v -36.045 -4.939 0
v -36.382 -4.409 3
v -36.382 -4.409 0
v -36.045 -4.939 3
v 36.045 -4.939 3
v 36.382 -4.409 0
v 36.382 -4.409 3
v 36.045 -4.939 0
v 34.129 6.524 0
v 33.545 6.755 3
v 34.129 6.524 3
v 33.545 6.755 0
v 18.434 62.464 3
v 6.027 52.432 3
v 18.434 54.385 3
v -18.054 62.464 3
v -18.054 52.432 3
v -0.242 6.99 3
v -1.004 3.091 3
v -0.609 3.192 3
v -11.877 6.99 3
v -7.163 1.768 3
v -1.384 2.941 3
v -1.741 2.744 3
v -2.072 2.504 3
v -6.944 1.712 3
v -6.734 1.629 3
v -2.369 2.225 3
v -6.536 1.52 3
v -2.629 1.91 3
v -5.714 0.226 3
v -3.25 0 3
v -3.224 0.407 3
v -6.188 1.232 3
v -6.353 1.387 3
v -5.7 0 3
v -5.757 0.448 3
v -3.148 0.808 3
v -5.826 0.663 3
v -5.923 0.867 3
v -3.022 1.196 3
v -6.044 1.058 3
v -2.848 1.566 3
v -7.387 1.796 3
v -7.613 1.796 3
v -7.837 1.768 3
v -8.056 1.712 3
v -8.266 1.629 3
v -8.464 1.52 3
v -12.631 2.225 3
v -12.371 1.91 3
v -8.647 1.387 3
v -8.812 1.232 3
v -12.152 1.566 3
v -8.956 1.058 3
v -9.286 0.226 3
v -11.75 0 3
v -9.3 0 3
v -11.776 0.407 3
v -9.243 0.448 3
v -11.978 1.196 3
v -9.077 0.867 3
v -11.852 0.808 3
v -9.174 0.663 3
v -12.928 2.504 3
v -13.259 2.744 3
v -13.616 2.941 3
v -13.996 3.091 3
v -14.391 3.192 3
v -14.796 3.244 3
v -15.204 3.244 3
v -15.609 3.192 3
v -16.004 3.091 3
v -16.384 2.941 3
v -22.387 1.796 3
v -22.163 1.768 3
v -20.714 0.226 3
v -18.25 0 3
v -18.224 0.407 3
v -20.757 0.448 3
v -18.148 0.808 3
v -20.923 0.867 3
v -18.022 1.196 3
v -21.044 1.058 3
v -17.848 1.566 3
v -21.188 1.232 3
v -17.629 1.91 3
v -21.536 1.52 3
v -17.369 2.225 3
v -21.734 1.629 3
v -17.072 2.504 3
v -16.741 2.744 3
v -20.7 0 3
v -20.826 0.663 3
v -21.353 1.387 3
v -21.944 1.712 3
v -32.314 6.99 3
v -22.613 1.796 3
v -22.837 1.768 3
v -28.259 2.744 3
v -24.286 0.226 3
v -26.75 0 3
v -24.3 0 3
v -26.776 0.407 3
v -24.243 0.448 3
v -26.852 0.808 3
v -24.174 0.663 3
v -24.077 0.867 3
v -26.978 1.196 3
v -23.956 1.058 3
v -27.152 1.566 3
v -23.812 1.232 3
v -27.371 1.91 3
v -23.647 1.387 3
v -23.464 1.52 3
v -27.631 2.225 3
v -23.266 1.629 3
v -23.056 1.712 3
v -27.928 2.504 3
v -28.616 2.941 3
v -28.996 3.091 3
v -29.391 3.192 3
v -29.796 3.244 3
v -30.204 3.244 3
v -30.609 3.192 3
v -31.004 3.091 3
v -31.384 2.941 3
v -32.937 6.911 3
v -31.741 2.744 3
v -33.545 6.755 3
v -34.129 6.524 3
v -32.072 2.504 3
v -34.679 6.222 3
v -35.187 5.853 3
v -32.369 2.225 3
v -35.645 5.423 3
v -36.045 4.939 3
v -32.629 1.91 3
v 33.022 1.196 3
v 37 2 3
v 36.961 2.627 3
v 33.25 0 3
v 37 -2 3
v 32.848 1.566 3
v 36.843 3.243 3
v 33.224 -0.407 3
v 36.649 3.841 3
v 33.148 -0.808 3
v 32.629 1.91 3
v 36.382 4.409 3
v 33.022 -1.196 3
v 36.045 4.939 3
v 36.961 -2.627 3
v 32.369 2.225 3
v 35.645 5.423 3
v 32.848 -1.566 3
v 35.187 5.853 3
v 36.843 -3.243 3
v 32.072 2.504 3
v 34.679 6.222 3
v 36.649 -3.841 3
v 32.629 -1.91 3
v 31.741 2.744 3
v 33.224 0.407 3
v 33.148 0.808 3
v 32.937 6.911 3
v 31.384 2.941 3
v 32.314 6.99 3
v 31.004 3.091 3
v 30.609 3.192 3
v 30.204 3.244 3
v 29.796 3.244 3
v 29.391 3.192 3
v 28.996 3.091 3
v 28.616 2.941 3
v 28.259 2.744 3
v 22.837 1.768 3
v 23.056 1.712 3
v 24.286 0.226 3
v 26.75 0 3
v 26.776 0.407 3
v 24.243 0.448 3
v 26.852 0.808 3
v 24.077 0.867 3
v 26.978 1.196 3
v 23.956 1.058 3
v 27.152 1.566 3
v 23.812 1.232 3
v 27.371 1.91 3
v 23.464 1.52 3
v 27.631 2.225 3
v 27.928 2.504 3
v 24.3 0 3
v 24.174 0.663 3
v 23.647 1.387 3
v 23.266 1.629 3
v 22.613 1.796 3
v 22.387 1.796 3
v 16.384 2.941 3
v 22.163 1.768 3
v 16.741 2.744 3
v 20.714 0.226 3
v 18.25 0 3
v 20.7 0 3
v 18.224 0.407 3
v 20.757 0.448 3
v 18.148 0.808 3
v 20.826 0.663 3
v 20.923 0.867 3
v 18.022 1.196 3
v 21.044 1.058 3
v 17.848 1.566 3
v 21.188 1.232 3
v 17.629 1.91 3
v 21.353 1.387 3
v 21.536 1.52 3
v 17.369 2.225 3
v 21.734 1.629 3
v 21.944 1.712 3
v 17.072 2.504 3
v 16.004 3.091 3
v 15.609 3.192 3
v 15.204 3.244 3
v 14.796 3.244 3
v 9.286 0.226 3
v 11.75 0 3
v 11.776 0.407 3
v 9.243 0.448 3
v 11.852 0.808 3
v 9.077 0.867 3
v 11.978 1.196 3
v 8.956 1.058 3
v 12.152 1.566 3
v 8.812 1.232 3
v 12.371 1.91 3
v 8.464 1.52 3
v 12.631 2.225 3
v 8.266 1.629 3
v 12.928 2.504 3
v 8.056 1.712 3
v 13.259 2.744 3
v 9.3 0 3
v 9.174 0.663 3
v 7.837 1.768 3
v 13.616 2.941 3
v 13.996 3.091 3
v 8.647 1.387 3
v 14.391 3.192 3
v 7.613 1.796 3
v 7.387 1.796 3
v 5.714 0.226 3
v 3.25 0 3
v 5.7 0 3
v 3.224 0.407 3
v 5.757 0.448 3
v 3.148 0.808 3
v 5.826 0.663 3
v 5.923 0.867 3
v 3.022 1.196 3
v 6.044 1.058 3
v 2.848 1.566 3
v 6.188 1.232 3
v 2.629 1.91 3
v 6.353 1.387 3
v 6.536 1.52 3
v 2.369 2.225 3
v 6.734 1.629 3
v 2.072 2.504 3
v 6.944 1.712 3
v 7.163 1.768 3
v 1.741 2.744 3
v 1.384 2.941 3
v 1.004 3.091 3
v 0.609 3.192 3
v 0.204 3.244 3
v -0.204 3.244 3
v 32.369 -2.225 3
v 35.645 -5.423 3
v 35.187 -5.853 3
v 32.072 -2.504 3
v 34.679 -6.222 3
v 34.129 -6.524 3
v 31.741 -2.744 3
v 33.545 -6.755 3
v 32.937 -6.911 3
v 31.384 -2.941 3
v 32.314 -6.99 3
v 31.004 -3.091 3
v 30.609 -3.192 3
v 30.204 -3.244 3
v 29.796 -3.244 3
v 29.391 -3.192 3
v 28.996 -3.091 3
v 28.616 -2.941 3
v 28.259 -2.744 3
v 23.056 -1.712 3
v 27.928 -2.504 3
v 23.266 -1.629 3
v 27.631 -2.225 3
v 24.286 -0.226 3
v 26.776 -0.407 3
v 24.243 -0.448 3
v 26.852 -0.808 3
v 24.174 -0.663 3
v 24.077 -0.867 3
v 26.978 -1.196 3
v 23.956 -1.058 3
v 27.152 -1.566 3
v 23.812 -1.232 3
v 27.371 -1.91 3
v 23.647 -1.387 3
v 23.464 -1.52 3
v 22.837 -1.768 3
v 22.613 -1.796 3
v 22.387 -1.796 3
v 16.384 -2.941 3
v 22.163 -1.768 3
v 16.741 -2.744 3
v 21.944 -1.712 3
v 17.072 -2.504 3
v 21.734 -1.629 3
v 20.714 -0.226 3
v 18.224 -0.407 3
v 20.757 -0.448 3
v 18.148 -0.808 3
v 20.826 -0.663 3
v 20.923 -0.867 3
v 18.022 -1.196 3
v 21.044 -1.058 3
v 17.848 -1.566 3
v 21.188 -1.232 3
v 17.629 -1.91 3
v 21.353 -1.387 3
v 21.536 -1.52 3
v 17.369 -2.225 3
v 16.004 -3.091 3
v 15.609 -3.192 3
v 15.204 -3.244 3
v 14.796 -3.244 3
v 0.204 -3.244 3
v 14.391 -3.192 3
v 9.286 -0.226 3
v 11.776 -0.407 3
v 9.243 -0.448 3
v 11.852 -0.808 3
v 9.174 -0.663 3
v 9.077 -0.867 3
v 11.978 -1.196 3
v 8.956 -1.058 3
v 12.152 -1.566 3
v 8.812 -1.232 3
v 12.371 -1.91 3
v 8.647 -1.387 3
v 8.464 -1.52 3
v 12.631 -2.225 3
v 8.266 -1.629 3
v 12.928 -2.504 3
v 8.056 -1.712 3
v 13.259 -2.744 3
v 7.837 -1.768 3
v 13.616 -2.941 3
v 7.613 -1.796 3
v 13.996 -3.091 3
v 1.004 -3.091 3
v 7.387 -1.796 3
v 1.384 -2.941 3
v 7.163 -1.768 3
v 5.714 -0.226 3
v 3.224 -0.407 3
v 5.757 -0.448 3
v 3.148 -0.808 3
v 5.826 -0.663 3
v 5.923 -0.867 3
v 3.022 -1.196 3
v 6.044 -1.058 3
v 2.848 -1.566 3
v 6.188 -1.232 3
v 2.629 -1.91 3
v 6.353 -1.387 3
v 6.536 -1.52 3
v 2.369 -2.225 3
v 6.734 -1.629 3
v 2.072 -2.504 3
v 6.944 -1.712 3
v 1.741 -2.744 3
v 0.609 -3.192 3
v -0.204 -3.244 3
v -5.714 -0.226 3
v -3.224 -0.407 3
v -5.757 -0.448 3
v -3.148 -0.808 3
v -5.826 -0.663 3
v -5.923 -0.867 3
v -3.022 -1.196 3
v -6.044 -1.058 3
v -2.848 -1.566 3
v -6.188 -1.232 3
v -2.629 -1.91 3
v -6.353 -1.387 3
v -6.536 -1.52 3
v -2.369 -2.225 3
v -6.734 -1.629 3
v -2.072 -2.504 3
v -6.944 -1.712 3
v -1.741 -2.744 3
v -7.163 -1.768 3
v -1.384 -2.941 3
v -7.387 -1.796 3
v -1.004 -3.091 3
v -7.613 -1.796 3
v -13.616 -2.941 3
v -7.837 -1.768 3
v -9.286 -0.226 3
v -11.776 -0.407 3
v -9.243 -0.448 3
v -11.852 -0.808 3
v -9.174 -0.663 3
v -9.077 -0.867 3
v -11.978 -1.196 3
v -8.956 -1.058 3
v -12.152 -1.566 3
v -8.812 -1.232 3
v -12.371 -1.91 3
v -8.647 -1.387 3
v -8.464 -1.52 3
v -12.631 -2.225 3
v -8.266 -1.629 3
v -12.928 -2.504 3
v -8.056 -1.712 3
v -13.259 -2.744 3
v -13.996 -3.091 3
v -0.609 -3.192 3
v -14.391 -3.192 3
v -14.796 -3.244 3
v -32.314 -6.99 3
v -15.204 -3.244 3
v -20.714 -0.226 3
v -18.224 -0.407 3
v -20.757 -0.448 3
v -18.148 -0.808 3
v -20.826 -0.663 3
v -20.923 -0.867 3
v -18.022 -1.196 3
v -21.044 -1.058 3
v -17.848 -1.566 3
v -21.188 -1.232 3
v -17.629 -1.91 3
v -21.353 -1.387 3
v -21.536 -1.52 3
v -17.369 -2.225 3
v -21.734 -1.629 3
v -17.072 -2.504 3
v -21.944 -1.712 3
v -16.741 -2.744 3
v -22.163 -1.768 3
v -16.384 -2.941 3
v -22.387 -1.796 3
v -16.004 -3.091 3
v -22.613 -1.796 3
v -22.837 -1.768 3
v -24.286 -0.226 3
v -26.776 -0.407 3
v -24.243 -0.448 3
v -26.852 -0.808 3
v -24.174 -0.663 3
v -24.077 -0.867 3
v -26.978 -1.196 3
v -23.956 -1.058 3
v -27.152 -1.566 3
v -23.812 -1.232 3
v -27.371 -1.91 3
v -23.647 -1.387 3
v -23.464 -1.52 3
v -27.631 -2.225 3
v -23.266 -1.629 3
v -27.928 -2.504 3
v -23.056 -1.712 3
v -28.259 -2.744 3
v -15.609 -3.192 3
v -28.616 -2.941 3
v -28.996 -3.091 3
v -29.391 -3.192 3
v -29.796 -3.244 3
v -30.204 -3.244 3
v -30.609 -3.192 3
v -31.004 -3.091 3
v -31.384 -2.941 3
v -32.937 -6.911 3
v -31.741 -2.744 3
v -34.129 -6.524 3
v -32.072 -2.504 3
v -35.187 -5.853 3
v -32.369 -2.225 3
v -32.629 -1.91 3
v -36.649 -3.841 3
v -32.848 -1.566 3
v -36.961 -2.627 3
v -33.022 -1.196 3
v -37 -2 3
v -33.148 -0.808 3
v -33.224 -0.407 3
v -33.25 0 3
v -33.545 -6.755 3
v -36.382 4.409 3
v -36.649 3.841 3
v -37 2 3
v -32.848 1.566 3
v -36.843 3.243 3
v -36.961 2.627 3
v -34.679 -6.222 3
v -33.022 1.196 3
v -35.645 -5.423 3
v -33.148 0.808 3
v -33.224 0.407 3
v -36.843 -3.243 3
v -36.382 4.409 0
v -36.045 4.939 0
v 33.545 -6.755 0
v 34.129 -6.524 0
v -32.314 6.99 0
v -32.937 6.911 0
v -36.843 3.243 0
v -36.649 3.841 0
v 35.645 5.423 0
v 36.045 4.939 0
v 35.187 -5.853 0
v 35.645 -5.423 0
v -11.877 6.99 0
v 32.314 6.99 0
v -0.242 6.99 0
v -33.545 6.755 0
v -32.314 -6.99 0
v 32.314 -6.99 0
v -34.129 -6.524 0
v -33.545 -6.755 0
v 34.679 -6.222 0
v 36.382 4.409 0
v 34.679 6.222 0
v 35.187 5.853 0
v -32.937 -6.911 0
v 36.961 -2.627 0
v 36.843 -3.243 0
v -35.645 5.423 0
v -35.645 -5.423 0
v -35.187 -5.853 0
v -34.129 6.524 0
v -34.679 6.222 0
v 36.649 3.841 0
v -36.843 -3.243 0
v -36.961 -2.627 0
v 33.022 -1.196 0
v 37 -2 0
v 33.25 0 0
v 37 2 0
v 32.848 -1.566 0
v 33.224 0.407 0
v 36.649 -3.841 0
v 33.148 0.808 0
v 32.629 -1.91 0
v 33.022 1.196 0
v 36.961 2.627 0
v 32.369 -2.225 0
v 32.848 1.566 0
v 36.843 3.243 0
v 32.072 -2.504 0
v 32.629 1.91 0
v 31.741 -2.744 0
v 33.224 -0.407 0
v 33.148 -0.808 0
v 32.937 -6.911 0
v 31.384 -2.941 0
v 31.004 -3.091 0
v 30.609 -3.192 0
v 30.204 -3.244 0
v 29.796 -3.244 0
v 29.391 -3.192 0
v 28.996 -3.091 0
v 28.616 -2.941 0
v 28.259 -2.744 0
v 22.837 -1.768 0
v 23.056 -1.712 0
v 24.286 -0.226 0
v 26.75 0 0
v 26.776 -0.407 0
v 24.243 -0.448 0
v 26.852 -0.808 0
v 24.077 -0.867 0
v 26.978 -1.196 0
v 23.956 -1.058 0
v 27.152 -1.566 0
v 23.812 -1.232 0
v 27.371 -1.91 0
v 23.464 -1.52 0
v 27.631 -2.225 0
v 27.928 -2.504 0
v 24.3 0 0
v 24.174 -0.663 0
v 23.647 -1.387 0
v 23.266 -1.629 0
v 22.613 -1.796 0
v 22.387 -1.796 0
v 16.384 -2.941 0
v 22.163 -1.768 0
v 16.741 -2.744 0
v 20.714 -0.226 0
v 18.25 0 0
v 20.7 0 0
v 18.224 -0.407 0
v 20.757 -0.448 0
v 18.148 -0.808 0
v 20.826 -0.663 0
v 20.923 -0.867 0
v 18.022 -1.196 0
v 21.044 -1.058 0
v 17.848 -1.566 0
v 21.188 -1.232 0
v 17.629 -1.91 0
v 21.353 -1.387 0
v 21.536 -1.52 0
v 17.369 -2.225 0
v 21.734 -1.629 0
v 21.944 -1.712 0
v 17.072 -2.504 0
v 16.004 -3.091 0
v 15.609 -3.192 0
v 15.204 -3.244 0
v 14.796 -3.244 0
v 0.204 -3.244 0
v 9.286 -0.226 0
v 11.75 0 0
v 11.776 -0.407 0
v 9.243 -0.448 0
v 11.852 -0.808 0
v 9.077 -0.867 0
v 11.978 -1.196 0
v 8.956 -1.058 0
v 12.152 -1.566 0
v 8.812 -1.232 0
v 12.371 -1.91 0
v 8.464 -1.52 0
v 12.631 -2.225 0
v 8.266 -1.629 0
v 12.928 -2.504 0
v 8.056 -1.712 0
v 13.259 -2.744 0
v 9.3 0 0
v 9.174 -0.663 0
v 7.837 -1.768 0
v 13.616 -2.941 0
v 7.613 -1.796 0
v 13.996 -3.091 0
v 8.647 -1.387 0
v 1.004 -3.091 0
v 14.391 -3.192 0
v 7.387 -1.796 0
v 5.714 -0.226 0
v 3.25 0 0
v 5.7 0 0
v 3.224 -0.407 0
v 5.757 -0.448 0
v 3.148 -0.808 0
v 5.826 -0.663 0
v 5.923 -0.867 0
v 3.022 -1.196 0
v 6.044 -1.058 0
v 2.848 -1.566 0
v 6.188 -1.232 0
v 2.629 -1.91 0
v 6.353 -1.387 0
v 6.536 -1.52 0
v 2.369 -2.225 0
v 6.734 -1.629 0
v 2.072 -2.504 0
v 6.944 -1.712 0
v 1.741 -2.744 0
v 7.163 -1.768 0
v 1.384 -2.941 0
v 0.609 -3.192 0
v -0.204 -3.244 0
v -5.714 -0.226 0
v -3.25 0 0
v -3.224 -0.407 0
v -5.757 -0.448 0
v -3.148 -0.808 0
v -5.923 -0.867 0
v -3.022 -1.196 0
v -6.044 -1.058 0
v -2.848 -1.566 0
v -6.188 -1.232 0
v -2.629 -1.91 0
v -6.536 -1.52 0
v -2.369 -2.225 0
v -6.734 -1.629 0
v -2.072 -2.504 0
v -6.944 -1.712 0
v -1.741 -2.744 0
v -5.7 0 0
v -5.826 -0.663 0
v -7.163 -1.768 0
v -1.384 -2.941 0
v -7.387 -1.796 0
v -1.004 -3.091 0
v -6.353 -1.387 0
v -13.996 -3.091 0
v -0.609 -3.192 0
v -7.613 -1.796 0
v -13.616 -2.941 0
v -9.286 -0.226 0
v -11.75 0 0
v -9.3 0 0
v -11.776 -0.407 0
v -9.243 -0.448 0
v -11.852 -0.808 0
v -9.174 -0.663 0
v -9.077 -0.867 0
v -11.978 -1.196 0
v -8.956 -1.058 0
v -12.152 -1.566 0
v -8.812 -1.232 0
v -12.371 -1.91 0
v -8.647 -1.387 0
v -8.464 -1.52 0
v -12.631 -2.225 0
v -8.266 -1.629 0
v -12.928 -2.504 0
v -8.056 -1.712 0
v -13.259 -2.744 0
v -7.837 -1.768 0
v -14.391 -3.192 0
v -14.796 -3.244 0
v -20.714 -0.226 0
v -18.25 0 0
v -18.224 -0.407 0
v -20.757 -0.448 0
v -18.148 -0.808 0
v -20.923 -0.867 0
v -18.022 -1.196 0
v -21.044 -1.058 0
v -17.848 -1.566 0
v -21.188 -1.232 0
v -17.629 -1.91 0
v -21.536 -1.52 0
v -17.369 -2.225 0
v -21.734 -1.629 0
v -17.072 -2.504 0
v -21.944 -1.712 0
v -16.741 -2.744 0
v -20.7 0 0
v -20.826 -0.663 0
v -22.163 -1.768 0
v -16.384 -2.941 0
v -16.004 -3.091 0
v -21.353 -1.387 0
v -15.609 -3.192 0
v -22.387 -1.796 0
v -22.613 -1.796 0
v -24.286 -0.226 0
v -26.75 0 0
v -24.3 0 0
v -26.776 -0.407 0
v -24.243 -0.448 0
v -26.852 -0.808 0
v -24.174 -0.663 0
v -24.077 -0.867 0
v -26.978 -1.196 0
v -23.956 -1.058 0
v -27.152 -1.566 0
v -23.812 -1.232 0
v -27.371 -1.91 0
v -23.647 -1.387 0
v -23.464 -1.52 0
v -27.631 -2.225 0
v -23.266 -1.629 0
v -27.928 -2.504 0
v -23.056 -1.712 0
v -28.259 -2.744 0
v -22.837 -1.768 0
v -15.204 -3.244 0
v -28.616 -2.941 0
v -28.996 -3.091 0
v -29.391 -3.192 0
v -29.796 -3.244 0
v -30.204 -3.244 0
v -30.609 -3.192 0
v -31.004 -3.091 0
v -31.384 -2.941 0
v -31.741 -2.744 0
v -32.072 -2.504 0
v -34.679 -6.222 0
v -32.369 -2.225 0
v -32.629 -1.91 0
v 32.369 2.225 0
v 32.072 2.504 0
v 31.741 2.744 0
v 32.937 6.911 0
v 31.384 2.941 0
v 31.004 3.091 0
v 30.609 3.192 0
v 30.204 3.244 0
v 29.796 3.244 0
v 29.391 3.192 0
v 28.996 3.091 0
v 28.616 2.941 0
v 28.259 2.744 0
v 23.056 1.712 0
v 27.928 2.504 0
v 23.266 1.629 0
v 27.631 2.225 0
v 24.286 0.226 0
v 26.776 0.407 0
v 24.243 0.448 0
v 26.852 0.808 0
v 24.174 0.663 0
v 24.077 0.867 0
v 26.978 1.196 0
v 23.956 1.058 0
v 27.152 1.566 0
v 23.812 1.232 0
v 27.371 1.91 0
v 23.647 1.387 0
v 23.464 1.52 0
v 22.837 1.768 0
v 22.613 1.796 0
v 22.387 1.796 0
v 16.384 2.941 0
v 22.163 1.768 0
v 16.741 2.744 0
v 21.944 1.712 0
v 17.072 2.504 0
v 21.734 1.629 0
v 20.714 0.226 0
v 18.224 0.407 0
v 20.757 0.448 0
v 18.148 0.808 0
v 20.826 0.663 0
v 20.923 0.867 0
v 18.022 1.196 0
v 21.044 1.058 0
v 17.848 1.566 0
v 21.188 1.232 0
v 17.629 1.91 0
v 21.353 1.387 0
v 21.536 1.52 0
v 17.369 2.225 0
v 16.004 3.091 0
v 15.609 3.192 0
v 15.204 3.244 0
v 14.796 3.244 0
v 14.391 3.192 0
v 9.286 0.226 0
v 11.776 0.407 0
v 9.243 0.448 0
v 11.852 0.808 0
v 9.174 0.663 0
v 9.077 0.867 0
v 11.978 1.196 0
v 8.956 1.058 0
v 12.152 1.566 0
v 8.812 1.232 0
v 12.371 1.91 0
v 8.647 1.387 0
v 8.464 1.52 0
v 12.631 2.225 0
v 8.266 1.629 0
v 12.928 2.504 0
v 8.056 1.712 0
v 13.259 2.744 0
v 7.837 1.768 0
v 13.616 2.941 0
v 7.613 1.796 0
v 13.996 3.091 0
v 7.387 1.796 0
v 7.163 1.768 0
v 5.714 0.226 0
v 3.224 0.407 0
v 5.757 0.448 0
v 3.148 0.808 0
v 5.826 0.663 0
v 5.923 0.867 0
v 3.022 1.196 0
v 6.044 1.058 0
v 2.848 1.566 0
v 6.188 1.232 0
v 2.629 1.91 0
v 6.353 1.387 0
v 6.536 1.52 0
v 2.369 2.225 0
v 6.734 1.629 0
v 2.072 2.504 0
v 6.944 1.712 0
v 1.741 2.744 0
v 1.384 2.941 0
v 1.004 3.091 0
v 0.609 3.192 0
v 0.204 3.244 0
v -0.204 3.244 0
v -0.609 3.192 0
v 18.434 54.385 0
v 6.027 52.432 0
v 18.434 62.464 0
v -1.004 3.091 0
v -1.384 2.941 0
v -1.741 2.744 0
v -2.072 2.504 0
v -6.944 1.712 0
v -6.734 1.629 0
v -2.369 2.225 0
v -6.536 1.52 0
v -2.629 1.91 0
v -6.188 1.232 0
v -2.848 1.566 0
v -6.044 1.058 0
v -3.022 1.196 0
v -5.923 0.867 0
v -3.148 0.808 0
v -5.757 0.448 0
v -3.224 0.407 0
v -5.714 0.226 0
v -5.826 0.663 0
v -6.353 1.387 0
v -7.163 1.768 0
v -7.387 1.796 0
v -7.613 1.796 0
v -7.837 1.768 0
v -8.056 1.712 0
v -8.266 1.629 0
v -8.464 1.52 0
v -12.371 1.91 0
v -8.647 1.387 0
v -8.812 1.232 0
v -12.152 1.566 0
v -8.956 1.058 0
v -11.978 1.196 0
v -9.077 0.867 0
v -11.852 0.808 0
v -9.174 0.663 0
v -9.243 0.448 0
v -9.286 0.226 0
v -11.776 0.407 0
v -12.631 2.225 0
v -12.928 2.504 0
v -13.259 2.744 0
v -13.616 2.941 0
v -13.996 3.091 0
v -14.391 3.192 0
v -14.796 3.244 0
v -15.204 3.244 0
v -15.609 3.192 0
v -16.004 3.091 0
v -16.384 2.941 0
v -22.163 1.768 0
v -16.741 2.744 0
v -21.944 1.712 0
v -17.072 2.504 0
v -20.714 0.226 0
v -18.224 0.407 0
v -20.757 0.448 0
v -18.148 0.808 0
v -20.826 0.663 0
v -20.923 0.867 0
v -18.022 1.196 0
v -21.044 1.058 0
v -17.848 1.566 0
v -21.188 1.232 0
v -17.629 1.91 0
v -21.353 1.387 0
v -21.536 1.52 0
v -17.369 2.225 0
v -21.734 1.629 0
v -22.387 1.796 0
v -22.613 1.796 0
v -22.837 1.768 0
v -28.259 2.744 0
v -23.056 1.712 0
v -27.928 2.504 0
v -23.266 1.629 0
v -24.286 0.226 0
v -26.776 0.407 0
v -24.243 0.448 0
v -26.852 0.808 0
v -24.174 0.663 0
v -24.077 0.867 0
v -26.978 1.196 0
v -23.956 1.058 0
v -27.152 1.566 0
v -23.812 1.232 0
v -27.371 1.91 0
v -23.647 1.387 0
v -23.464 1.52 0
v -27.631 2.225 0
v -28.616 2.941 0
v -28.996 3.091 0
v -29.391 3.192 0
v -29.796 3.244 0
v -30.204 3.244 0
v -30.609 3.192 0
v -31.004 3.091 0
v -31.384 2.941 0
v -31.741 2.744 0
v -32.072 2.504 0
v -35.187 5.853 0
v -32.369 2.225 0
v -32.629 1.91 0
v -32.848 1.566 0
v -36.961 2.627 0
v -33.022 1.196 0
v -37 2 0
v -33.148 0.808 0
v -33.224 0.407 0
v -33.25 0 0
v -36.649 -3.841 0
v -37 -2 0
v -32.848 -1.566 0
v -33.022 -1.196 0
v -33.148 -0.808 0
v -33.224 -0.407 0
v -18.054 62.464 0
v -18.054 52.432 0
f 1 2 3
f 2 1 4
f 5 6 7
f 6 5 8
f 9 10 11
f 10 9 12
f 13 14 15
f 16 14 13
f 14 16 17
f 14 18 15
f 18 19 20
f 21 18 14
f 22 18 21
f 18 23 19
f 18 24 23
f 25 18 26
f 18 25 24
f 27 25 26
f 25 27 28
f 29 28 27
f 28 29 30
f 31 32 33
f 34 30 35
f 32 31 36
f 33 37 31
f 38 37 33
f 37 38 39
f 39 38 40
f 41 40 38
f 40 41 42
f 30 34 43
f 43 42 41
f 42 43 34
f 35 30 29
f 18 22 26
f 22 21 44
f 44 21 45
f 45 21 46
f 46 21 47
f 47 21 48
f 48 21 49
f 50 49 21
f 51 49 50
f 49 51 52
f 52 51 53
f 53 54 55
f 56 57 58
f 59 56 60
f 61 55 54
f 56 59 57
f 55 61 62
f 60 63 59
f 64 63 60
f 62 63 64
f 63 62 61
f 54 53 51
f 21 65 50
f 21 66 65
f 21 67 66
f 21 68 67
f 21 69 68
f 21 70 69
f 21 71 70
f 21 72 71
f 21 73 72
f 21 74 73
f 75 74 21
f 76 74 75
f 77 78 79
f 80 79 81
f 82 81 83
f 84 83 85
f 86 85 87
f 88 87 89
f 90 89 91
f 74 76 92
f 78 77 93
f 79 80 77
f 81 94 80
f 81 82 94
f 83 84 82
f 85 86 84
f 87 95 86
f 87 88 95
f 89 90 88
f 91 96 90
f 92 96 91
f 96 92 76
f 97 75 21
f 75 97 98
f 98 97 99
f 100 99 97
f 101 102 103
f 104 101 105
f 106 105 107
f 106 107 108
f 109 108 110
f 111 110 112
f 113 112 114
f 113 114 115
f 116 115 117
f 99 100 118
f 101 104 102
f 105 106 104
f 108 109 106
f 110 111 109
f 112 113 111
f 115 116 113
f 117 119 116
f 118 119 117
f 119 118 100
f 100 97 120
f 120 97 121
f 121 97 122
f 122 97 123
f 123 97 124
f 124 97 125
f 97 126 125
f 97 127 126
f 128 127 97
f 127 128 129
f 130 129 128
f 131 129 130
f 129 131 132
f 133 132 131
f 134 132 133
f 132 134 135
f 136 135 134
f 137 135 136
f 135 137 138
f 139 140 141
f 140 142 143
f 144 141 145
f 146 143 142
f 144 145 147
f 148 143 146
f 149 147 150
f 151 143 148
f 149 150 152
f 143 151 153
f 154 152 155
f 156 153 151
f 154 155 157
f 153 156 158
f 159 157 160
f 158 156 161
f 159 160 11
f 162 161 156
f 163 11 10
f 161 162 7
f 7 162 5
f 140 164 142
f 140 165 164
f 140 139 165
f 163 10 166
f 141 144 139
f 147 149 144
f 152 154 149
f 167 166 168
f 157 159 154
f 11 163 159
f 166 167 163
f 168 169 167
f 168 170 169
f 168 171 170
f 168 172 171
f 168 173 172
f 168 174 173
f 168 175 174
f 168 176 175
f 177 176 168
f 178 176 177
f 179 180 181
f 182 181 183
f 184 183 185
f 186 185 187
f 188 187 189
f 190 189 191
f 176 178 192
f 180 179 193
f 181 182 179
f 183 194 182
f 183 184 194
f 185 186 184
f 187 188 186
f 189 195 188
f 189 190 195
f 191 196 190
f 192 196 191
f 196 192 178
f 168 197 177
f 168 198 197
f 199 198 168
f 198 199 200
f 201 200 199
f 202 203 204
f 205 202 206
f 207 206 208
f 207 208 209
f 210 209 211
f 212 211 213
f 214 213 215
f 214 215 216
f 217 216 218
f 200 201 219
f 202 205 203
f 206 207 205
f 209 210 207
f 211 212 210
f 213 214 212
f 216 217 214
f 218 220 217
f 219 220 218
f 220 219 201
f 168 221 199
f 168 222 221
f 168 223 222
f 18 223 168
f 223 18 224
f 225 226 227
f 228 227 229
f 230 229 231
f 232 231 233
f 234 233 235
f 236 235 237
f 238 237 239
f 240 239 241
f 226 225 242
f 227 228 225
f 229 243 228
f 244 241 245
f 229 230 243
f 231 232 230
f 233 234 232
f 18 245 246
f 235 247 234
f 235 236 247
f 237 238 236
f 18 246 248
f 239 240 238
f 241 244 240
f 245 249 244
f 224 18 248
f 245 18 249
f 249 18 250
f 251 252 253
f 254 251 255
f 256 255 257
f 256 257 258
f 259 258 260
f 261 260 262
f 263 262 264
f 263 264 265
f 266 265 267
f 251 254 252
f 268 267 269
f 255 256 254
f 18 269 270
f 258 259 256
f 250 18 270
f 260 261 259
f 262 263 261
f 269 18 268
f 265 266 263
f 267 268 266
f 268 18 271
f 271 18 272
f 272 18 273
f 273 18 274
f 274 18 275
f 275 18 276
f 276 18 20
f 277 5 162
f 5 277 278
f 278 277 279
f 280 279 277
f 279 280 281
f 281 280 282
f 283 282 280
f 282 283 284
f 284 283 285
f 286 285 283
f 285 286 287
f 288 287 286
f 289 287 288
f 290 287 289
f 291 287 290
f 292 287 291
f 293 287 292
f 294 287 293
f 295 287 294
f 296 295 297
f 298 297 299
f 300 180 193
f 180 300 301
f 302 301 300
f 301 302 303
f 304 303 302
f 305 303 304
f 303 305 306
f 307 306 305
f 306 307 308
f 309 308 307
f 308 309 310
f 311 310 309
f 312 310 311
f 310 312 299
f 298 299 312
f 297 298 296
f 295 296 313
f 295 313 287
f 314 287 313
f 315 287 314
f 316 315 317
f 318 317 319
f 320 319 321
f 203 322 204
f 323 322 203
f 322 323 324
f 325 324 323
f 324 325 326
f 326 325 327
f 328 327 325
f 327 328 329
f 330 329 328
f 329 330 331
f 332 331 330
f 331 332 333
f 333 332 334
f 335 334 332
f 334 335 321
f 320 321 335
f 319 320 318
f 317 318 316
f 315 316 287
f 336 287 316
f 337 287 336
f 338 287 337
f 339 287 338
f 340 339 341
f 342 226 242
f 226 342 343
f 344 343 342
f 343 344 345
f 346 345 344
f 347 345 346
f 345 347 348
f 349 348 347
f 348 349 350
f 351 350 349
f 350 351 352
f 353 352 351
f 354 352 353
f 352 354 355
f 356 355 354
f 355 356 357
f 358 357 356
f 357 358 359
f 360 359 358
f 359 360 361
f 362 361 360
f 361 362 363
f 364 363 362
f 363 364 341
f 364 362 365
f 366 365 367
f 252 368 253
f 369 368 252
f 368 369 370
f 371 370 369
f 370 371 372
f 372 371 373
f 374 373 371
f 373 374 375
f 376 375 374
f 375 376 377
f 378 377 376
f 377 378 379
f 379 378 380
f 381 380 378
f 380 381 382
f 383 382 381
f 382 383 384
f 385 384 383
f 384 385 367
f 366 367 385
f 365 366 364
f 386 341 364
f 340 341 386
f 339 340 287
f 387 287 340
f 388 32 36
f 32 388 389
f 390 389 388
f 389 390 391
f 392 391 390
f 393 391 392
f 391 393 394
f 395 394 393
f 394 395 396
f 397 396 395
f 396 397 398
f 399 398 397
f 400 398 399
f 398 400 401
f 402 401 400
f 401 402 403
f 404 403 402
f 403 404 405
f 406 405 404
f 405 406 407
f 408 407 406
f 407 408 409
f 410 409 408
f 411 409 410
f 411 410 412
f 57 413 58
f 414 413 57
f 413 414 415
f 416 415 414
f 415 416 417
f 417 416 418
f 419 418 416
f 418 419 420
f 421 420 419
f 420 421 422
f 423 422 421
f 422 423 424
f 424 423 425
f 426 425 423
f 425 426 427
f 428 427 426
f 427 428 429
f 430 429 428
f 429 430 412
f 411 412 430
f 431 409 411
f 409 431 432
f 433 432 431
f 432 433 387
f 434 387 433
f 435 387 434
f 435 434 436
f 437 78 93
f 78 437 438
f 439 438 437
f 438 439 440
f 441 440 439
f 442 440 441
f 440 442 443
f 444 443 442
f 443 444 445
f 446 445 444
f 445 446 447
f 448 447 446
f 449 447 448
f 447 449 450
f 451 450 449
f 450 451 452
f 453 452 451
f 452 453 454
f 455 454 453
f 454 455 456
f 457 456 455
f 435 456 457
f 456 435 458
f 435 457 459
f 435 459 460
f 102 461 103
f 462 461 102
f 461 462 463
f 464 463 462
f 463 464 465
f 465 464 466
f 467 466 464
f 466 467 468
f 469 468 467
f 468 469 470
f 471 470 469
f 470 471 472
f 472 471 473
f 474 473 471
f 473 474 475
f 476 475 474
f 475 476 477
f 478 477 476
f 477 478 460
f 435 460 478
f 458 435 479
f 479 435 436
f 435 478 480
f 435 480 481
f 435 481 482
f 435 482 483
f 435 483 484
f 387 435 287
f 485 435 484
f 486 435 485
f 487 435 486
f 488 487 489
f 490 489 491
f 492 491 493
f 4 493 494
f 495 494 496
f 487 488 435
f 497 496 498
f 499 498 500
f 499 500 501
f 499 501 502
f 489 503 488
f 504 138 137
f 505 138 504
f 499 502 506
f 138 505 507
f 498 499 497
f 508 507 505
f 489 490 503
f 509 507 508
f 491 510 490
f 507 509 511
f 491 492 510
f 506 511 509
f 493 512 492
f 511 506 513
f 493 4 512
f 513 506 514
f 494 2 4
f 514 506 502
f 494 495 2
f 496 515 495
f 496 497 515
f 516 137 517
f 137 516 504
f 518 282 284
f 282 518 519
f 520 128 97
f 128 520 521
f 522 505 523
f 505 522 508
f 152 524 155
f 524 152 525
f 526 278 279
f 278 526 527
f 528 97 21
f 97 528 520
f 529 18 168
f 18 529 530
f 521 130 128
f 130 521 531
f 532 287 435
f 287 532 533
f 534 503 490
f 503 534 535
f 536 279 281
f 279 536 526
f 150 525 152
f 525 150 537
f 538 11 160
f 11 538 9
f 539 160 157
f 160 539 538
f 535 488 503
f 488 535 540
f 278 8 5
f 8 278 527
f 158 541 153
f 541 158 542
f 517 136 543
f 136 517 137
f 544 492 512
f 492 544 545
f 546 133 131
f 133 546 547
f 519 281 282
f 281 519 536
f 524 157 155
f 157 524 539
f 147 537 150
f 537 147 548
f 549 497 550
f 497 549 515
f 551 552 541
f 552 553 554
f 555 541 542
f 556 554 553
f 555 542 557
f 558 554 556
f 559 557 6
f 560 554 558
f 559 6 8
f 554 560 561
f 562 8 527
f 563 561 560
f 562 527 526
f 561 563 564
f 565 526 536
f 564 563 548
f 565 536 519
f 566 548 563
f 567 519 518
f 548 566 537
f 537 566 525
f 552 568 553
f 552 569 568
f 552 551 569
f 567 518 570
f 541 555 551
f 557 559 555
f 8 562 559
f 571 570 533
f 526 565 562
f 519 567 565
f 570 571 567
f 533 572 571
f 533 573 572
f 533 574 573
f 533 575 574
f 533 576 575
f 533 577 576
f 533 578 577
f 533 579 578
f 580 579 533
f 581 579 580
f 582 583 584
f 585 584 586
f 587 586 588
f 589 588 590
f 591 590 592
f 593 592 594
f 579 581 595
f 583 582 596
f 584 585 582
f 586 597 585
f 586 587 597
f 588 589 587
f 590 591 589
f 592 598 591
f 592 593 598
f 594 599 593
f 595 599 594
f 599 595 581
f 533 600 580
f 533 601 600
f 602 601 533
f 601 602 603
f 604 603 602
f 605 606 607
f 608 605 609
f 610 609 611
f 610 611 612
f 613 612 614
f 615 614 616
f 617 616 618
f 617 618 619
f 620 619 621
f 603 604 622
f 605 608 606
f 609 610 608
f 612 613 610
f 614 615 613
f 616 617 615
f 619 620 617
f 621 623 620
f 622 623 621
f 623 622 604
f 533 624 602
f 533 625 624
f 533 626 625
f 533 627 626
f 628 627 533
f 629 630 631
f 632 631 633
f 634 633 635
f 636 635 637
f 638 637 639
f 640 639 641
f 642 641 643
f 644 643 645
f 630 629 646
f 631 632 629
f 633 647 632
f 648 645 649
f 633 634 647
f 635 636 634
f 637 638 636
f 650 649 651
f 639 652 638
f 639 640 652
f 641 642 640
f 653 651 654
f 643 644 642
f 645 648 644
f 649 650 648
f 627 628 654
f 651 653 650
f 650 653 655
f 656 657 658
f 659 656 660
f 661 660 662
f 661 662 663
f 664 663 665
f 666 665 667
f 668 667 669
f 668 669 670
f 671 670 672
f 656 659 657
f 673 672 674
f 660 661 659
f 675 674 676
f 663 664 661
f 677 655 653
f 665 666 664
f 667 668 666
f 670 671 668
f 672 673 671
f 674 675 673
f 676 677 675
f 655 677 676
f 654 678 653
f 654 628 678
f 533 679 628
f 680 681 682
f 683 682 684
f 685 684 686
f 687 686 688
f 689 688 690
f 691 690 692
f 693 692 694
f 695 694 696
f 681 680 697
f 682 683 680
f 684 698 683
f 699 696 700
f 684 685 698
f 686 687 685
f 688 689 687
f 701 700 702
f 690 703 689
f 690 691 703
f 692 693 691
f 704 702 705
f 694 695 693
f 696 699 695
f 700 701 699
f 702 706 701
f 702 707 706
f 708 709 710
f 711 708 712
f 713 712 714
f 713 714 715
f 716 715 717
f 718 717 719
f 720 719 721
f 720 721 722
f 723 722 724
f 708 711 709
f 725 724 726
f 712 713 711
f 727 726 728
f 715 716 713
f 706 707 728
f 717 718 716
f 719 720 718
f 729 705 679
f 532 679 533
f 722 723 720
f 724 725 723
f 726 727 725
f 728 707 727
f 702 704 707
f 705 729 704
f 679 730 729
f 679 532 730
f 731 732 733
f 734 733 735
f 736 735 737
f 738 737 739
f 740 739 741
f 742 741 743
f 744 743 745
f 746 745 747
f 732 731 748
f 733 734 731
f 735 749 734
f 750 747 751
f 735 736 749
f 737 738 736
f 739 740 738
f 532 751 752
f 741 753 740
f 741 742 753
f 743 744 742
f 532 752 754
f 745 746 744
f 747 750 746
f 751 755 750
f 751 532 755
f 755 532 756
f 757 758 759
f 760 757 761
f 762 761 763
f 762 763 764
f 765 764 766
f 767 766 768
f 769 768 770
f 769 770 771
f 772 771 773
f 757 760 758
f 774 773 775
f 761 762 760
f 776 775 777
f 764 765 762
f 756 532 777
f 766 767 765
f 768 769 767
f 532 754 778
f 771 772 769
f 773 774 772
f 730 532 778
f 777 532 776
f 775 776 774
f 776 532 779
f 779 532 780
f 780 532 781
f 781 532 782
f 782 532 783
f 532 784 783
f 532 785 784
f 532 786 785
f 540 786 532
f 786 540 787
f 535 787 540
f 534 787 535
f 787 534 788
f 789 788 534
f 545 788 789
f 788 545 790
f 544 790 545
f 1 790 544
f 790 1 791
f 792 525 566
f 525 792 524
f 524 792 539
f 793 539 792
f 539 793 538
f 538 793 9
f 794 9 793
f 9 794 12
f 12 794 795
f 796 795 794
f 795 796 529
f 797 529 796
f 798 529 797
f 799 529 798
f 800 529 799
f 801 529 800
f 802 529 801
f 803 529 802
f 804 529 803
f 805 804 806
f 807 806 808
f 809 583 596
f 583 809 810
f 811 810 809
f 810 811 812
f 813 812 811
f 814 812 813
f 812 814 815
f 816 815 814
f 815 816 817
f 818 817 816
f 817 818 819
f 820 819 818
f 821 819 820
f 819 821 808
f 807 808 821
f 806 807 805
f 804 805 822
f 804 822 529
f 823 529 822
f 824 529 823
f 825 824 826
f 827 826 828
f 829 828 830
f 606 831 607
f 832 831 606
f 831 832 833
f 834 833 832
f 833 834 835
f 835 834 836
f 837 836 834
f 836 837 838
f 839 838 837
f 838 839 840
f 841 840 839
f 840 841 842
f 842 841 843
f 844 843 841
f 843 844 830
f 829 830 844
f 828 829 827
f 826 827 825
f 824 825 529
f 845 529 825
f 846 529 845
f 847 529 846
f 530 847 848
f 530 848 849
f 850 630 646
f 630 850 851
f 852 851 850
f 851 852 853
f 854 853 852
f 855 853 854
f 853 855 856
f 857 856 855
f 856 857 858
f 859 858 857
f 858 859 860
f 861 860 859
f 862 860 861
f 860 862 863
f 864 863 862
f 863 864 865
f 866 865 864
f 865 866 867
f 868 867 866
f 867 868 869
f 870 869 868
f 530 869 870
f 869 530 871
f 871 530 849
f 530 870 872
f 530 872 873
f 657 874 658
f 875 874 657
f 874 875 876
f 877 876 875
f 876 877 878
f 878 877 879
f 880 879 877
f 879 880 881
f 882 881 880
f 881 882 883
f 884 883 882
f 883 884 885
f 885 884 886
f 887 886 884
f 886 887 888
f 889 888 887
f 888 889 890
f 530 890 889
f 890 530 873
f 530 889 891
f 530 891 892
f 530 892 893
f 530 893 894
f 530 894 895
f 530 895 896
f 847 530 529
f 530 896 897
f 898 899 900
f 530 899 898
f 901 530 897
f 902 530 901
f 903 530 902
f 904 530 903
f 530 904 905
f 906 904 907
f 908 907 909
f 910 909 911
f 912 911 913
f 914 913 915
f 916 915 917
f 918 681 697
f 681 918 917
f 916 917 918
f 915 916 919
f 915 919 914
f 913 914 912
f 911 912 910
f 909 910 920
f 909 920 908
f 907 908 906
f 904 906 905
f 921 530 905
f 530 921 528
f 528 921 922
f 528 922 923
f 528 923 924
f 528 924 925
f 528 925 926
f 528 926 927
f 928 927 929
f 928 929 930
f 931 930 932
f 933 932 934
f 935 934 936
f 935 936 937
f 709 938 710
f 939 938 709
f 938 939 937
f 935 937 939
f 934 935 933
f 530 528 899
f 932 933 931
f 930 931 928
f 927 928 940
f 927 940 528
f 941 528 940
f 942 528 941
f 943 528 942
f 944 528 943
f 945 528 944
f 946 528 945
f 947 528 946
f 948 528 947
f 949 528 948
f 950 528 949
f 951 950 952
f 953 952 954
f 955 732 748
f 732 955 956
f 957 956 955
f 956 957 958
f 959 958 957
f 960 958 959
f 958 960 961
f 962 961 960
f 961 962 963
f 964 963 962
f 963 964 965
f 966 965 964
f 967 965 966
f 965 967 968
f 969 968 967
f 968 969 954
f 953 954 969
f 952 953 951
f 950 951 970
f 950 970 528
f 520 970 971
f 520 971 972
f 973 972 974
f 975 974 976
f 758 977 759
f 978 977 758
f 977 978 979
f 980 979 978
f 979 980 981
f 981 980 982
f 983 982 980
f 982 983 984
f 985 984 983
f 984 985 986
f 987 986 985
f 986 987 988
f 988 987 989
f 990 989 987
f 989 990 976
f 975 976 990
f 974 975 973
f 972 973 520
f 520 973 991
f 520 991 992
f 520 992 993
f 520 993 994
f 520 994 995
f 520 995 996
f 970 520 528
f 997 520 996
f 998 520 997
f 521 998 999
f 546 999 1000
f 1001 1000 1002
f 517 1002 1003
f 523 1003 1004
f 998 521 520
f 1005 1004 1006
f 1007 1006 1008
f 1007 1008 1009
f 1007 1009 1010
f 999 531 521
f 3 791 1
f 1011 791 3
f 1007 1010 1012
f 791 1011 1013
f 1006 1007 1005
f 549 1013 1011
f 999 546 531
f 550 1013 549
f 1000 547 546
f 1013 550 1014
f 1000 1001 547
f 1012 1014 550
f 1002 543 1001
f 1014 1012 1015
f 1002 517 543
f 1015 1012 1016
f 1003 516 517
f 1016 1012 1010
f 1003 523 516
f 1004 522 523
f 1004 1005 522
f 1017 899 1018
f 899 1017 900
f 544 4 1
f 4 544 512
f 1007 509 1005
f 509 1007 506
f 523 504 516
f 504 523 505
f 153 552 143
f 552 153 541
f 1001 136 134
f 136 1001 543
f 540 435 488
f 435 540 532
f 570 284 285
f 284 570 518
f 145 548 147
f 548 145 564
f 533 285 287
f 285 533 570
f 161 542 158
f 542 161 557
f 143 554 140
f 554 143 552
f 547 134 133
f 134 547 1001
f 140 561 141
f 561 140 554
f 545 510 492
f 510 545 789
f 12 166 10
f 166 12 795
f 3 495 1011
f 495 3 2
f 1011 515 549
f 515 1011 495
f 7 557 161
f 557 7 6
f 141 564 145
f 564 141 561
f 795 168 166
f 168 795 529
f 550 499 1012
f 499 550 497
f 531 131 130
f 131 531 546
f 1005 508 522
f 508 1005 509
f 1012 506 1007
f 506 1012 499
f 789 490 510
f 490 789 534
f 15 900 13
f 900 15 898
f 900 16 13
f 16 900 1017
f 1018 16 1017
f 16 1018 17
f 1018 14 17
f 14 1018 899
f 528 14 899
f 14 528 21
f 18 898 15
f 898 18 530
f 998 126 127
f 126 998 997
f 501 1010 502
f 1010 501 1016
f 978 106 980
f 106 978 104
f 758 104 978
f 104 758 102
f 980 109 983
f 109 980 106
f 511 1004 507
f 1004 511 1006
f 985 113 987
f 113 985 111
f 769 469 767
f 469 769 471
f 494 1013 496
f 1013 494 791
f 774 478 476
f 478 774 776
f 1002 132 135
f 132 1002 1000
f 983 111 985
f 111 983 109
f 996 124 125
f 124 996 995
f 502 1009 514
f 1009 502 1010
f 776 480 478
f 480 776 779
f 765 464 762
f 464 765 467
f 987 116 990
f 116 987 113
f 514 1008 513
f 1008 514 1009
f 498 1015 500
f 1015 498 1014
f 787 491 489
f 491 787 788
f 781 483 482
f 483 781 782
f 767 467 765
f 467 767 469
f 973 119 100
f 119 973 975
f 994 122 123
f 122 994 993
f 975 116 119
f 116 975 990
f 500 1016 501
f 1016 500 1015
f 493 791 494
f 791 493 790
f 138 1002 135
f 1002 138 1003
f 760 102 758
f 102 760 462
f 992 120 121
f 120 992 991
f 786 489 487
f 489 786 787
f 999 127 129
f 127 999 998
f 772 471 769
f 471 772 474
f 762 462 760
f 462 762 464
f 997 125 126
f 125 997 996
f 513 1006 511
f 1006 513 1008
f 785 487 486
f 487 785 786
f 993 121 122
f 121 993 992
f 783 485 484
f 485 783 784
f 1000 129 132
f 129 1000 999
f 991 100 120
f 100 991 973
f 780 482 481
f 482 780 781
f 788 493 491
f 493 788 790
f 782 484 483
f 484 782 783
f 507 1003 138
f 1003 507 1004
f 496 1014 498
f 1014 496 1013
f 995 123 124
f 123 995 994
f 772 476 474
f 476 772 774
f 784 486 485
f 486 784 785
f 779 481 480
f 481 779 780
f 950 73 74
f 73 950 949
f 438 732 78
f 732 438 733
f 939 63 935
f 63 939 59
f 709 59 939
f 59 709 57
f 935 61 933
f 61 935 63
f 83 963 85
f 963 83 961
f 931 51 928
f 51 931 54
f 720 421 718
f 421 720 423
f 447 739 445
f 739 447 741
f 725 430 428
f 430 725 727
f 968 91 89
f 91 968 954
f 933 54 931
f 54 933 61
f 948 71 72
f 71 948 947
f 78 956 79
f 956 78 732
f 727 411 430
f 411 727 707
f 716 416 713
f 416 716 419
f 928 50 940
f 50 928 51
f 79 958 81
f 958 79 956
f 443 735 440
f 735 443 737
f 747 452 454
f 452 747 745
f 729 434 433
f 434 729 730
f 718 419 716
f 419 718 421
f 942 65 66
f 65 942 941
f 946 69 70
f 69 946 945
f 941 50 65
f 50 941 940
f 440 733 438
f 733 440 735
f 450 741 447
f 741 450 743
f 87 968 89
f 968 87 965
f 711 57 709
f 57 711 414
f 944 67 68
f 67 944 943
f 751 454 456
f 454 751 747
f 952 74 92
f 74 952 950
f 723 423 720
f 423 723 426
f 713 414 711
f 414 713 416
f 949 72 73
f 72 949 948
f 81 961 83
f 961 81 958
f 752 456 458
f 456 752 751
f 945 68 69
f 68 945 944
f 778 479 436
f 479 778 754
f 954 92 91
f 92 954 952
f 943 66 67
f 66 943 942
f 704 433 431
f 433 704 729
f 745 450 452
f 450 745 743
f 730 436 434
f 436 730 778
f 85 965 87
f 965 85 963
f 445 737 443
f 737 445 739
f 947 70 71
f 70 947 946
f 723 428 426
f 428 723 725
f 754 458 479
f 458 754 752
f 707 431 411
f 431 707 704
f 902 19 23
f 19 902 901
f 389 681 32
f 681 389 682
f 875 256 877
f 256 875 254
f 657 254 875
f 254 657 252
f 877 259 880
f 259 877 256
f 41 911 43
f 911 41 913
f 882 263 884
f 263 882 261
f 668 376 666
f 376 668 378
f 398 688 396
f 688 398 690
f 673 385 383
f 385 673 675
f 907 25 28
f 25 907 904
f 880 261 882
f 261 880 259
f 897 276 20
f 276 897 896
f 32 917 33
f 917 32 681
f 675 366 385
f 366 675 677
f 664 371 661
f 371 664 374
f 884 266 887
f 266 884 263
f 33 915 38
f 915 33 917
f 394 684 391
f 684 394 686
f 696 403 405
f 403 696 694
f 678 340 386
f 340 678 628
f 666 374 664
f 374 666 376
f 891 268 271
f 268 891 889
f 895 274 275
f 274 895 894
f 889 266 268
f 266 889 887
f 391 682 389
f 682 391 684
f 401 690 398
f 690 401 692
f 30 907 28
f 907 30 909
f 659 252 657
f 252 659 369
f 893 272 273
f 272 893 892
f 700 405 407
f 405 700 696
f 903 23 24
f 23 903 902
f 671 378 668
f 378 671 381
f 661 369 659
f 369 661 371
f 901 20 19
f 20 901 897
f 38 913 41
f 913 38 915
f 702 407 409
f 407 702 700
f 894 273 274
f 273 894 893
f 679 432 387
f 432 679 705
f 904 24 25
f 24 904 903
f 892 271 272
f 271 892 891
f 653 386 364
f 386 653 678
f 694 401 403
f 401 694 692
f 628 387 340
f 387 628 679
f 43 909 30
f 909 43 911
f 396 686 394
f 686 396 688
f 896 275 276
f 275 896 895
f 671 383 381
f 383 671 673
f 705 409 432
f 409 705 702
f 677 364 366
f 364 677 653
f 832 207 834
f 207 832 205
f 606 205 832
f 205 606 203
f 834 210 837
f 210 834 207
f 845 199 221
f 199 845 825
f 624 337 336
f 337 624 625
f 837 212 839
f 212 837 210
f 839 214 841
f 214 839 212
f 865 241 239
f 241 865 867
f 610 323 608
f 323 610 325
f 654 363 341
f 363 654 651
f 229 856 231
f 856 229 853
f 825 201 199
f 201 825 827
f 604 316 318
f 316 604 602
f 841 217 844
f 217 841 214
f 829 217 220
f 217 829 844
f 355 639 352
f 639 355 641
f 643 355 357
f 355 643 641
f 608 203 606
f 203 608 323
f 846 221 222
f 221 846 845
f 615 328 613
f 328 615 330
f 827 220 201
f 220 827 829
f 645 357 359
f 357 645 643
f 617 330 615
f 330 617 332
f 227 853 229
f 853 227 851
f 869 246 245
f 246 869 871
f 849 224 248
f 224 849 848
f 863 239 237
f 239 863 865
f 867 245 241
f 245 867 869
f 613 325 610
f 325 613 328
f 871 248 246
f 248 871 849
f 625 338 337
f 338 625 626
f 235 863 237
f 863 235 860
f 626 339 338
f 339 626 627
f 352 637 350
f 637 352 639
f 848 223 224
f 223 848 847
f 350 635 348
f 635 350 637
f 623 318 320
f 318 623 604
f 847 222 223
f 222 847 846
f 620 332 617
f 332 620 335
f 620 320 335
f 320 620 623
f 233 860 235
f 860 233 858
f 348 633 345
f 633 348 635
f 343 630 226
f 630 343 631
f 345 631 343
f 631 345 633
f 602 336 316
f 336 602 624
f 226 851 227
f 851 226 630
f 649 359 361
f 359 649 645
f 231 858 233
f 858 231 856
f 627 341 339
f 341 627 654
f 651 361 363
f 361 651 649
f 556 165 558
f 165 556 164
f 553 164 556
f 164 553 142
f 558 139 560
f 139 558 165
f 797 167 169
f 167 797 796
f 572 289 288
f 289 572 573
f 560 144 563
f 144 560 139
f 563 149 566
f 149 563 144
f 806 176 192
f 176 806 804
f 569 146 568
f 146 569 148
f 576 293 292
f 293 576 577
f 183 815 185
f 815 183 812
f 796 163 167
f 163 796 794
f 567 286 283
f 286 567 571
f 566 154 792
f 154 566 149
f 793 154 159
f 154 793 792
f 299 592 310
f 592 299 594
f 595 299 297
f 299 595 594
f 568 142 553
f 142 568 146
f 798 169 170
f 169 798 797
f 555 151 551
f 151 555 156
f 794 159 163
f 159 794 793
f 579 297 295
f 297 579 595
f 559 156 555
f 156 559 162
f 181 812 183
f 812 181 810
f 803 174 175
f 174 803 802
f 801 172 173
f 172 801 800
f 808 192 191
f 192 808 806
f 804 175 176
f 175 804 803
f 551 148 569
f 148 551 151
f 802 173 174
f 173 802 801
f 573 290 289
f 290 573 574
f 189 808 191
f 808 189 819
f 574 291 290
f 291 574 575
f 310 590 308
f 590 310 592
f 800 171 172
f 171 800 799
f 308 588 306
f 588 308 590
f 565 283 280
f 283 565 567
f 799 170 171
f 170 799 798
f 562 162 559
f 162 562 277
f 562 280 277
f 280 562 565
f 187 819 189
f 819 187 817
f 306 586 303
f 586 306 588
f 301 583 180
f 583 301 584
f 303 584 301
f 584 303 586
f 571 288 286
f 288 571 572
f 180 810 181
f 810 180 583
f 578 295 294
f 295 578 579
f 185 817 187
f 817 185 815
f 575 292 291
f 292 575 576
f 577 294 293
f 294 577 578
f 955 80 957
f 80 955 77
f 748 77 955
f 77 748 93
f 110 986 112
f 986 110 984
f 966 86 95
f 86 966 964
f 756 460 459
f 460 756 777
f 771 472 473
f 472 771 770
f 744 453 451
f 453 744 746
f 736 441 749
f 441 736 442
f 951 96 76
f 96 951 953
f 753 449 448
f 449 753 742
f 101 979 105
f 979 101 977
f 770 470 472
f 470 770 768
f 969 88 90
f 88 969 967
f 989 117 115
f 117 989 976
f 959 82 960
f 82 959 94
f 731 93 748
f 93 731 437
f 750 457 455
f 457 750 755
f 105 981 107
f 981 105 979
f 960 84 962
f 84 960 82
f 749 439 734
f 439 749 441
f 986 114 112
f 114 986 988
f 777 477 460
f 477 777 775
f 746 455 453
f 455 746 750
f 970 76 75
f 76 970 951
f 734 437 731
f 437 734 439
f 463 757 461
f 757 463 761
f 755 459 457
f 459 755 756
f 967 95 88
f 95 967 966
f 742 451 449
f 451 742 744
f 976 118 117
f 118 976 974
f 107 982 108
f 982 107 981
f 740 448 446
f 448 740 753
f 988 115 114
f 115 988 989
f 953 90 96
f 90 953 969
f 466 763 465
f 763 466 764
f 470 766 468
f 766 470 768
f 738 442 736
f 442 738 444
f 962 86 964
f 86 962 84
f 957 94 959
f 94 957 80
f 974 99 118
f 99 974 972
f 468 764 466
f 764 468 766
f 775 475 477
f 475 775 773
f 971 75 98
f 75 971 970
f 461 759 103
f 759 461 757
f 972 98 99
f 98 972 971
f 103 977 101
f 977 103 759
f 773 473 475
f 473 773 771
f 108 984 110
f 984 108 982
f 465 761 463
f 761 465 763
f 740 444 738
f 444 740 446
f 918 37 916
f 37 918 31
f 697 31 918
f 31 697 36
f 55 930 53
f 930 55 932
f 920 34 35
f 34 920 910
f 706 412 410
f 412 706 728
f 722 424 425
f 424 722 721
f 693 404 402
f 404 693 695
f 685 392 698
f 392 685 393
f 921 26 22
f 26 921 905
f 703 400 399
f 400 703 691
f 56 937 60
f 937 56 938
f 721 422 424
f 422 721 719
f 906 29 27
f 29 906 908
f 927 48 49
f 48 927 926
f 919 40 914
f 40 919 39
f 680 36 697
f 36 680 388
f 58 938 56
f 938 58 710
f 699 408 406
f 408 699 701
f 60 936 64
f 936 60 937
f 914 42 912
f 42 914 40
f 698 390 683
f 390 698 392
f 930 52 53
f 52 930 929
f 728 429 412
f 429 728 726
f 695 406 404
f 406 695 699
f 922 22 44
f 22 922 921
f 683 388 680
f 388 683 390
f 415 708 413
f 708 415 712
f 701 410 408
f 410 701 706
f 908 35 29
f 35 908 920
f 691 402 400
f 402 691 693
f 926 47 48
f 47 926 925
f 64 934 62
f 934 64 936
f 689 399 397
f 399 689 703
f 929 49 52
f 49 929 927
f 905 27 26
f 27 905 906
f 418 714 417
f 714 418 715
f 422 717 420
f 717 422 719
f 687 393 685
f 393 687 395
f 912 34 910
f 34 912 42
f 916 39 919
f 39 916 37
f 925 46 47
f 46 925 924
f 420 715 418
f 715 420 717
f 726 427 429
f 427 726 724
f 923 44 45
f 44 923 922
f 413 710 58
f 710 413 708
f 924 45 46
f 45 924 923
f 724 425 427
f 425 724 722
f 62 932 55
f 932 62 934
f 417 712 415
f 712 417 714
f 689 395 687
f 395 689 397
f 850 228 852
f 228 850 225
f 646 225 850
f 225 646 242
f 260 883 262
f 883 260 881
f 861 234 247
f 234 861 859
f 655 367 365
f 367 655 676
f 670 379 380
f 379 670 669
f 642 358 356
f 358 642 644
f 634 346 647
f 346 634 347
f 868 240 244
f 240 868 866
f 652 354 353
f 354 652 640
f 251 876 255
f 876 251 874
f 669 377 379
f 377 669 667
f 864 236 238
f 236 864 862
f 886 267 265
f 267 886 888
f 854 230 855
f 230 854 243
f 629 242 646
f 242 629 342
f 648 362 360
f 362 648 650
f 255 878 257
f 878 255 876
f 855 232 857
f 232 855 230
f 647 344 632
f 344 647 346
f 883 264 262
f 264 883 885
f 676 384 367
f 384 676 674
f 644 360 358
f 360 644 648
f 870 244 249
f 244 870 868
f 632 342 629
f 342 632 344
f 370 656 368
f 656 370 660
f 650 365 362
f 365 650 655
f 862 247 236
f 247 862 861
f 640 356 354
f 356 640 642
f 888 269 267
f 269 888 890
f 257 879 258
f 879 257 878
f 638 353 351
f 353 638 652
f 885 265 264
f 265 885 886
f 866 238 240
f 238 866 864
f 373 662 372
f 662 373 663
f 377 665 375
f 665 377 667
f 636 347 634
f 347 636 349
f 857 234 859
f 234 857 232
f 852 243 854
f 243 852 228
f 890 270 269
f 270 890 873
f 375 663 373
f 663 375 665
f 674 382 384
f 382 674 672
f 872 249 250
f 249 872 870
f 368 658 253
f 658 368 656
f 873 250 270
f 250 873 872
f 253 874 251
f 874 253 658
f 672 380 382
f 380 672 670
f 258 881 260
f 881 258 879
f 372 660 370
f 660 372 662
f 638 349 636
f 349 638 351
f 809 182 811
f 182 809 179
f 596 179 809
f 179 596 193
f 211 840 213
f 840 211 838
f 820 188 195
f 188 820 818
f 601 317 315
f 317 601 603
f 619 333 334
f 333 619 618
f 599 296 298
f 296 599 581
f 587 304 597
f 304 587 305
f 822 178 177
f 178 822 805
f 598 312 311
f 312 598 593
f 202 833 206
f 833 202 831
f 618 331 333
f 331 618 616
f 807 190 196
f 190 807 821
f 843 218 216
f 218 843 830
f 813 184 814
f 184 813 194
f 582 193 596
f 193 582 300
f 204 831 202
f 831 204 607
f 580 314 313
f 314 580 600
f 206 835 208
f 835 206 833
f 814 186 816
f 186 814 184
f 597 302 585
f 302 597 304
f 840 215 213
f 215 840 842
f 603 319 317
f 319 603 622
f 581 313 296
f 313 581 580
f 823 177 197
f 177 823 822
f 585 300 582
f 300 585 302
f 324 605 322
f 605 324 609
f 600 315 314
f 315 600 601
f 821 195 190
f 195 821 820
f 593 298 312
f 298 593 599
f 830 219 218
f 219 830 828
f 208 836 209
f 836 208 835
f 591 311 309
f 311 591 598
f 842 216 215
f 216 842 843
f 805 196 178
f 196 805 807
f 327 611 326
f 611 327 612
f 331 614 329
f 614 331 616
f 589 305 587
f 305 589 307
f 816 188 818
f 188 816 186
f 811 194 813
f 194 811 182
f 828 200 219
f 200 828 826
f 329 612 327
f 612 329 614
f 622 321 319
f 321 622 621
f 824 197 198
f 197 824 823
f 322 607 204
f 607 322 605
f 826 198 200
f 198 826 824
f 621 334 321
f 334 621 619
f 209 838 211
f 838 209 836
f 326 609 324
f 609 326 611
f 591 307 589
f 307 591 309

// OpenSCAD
$fn = 50;


difference() {
	union() {
		hull() {
			translate(v = [-32.0000000000, 2.0000000000, 0]) {
				cylinder(h = 3, r = 5);
			}
			translate(v = [32.0000000000, 2.0000000000, 0]) {
				cylinder(h = 3, r = 5);
			}
			translate(v = [-32.0000000000, -2.0000000000, 0]) {
				cylinder(h = 3, r = 5);
			}
			translate(v = [32.0000000000, -2.0000000000, 0]) {
				cylinder(h = 3, r = 5);
			}
		}
		translate(v = [0, 61.1111111111, 0]) {
			linear_extrude(height = 3) {
				text(font = "DejaVu Sans Mono:style=Bold", halign = "center", size = 57.0000000000, text = "7", valign = "top");
			}
		}
	}
	union() {
		translate(v = [-30.0000000000, 0.0000000000, 0]) {
			translate(v = [0, 0, -100]) {
				cylinder(h = 200, r = 3.2500000000);
			}
		}
		translate(v = [-15.0000000000, 0.0000000000, 0]) {
			translate(v = [0, 0, -100]) {
				cylinder(h = 200, r = 3.2500000000);
			}
		}
		translate(v = [0, 0, -100]) {
			cylinder(h = 200, r = 3.2500000000);
		}
		translate(v = [15.0000000000, 0.0000000000, 0]) {
			translate(v = [0, 0, -100]) {
				cylinder(h = 200, r = 3.2500000000);
			}
		}
		translate(v = [30.0000000000, 0.0000000000, 0]) {
			translate(v = [0, 0, -100]) {
				cylinder(h = 200, r = 3.2500000000);
			}
		}
		translate(v = [-30.0000000000, 0.0000000000, 0]) {
			translate(v = [0, 0, -100]) {
				cylinder(h = 200, r = 1.8000000000);
			}
		}
		translate(v = [-22.5000000000, 0.0000000000, 0]) {
			translate(v = [0, 0, -100]) {
				cylinder(h = 200, r = 1.8000000000);
			}
		}
		translate(v = [-15.0000000000, 0.0000000000, 0]) {
			translate(v = [0, 0, -100]) {
				cylinder(h = 200, r = 1.8000000000);
			}
		}
		translate(v = [-7.5000000000, 0.0000000000, 0]) {
			translate(v = [0, 0, -100]) {
				cylinder(h = 200, r = 1.8000000000);
			}
		}
		translate(v = [0, 0, -100]) {
			cylinder(h = 200, r = 1.8000000000);
		}
		translate(v = [7.5000000000, 0.0000000000, 0]) {
			translate(v = [0, 0, -100]) {
				cylinder(h = 200, r = 1.8000000000);
			}
		}
		translate(v = [15.0000000000, 0.0000000000, 0]) {
			translate(v = [0, 0, -100]) {
				cylinder(h = 200, r = 1.8000000000);
			}
		}
		translate(v = [22.5000000000, 0.0000000000, 0]) {
			translate(v = [0, 0, -100]) {
				cylinder(h = 200, r = 1.8000000000);
			}
		}
		translate(v = [30.0000000000, 0.0000000000, 0]) {
			translate(v = [0, 0, -100]) {
				cylinder(h = 200, r = 1.8000000000);
			}
		}
	}
}
